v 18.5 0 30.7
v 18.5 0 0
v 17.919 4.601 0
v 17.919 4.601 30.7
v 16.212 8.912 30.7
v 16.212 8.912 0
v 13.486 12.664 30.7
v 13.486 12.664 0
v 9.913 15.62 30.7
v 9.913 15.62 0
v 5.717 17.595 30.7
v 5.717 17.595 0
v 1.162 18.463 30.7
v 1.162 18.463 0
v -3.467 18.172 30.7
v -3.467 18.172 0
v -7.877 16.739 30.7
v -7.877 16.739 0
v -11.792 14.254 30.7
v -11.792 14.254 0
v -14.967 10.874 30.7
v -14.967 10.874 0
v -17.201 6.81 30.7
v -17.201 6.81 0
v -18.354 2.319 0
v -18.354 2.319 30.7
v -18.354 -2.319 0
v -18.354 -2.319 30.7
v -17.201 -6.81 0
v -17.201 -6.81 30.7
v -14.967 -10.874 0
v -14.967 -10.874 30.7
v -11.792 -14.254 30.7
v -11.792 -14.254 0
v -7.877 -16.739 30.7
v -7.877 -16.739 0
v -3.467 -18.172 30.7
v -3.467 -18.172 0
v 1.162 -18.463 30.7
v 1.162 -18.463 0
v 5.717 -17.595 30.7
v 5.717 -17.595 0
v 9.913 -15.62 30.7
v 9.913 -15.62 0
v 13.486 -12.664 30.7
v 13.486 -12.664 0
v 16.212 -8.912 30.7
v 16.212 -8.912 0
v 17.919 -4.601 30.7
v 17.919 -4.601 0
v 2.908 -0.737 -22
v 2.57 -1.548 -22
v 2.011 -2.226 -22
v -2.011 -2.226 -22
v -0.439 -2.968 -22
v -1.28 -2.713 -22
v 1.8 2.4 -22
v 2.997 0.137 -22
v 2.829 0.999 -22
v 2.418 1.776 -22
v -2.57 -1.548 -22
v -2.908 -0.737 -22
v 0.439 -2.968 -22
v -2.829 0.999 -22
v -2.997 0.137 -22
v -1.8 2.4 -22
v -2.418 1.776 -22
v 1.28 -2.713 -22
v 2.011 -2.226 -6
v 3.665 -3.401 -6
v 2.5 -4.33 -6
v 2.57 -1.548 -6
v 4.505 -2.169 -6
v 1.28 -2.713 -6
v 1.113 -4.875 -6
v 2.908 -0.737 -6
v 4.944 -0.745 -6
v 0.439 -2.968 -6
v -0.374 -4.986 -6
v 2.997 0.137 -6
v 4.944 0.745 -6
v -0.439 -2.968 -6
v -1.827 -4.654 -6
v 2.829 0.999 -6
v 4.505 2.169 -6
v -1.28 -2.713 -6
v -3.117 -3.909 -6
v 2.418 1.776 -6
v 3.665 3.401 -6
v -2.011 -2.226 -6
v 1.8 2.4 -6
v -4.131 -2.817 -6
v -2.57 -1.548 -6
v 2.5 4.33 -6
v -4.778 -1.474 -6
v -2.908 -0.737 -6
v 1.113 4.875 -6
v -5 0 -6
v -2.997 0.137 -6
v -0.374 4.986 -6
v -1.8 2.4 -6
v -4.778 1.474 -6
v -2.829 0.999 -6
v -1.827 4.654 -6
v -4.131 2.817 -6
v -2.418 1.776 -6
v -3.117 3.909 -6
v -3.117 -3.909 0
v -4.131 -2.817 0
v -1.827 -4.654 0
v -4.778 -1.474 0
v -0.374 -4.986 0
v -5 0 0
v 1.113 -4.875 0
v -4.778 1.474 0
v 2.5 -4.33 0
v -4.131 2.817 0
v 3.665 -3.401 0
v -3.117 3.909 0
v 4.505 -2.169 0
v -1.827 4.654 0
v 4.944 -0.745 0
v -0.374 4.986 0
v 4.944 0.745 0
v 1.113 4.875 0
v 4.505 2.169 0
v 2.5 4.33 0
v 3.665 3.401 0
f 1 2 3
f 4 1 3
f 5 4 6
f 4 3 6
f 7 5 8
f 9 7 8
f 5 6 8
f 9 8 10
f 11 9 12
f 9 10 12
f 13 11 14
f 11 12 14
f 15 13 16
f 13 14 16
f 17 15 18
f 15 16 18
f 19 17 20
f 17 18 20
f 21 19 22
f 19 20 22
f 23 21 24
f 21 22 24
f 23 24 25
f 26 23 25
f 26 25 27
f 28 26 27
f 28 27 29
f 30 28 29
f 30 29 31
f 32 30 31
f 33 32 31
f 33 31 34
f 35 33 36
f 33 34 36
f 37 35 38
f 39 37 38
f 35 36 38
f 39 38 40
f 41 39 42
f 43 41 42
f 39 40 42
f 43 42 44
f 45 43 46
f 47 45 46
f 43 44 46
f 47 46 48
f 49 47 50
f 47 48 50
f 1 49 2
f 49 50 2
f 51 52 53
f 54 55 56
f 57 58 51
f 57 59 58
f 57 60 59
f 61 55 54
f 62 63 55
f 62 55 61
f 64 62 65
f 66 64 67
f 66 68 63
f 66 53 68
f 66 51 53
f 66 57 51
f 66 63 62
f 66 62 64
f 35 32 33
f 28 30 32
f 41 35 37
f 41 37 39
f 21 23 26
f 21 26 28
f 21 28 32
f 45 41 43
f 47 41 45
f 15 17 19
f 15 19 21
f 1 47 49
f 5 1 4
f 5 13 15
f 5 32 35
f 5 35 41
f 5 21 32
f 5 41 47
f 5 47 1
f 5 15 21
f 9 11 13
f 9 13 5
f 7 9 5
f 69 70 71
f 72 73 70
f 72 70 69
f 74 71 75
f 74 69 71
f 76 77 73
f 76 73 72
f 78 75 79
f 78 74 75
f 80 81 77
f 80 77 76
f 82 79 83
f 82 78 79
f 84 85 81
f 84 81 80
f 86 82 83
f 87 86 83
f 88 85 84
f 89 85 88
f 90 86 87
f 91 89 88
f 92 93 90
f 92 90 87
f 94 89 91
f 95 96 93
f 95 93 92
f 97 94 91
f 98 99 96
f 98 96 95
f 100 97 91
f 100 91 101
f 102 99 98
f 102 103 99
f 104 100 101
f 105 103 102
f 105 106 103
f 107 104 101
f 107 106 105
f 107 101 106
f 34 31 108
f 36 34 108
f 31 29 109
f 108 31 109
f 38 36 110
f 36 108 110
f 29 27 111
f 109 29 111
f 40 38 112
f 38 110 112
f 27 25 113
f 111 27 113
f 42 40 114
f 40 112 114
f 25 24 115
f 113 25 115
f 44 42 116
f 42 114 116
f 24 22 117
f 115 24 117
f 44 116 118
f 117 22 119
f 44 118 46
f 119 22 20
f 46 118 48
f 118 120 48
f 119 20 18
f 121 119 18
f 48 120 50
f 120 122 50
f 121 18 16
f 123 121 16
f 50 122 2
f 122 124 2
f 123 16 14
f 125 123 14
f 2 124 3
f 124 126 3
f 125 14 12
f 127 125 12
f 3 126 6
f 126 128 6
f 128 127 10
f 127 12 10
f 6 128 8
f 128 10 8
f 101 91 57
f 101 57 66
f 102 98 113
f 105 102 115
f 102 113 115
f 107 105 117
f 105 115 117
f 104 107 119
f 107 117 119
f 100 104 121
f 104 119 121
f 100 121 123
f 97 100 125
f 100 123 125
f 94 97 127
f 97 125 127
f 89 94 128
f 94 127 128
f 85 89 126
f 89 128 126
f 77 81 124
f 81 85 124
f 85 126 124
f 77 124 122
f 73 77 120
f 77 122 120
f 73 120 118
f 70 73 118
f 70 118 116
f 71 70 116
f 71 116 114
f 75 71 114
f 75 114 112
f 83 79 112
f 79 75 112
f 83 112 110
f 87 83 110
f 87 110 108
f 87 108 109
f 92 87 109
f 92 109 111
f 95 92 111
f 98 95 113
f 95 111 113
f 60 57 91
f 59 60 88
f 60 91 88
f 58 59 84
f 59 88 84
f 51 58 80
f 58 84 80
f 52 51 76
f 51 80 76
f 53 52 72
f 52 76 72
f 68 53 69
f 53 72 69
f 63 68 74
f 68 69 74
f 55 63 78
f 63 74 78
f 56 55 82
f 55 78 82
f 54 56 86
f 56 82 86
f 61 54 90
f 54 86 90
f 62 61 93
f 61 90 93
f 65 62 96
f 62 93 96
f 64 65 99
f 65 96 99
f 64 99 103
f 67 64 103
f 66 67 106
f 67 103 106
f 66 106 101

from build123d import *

# Parameters (mm, degrees)
ESQUISSE1_R                  = 18.5
BOSS_EXTRU_1_DEPTH           = 30.7
ESQUISSE2_R                  = 5
BOSS_EXTRU_2_DEPTH           = 6
ESQUISSE3_R                  = 3
BOSS_EXTRU_3_DEPTH           = 16
ENL_V_MAT_EXTRU_2_DEPTH      = 59.836978168
ENL_V_MAT_EXTRU_2_DEPTH_BACK = 16


with BuildPart() as part:
    # Esquisse1 → Boss.-Extru.1 (new body)
    with BuildSketch(Plane.XY):
        Circle(ESQUISSE1_R)
    extrude(amount=BOSS_EXTRU_1_DEPTH)

    # Esquisse2 → Boss.-Extru.2 (add)
    with BuildSketch(Plane(origin=(0, 0, 0), x_dir=(-1, 0, 0), z_dir=(0, 0, -1))):
        Circle(ESQUISSE2_R)
    extrude(amount=BOSS_EXTRU_2_DEPTH)

    # Esquisse3 → Boss.-Extru.3 (add)
    with BuildSketch(Plane(origin=(0, 0, -6), x_dir=(-1, 0, 0), z_dir=(0, 0, -1))):
        Circle(ESQUISSE3_R)
    extrude(amount=BOSS_EXTRU_3_DEPTH)

    # Esquisse4 → Enlèv. mat.-Extru.2 (cut, two sides: drawn at the far end of the back side and taken through both)
    with BuildSketch(Plane(origin=(0, 0, -22), x_dir=(-1, 0, 0), z_dir=(0, 0, -1)).offset(-ENL_V_MAT_EXTRU_2_DEPTH_BACK)):
        Polygon((-70.071777045, 2.4), (-1.8, 2.4), (1.8, 2.4), (70.071777045, 2.4), (70.071777045, 138.94355409), (-70.071777045, 138.94355409), align=None)
    extrude(amount=ENL_V_MAT_EXTRU_2_DEPTH + ENL_V_MAT_EXTRU_2_DEPTH_BACK, mode=Mode.SUBTRACT)


solid = part.part
